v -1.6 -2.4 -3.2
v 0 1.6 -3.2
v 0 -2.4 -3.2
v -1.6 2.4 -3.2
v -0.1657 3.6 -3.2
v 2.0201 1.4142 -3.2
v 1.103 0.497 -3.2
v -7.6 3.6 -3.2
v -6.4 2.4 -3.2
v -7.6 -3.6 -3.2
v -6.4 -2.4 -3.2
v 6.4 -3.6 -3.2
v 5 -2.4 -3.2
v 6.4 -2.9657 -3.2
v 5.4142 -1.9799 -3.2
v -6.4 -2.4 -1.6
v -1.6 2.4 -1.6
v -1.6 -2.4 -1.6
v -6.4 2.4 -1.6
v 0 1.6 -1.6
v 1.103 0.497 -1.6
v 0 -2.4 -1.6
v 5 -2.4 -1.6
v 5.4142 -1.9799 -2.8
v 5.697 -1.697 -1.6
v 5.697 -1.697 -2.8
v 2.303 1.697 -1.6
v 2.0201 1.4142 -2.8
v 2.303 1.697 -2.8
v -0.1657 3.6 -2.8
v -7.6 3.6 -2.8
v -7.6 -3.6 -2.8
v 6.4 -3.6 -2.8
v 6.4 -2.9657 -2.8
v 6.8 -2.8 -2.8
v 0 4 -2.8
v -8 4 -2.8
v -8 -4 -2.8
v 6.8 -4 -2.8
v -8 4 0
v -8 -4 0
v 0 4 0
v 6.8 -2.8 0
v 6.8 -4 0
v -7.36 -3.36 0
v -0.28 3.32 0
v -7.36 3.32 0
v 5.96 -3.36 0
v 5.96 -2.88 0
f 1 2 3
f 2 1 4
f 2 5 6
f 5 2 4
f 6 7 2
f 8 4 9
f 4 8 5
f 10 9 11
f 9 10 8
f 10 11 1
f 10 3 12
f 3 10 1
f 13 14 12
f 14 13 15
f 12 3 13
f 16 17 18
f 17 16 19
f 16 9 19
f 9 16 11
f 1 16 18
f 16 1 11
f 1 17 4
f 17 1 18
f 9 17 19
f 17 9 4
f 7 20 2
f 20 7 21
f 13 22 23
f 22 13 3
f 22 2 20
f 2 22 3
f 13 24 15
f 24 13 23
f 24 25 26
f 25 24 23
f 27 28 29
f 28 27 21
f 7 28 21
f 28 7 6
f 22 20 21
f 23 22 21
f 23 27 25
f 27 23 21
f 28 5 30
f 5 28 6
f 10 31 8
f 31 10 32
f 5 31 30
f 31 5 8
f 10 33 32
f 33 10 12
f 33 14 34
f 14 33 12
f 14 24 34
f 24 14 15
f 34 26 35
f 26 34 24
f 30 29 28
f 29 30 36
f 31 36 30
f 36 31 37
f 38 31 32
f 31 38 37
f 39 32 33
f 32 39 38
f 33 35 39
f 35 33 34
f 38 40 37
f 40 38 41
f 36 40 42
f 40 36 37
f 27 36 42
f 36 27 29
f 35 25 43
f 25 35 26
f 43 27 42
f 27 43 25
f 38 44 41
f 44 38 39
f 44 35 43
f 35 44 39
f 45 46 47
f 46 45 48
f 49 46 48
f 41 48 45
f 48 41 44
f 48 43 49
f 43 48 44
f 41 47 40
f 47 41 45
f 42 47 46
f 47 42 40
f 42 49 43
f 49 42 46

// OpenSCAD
// file: ../p/rect3.scad
use <../lib.scad>
function ldraw_lib__rect3() = [
// 0 Rectangle with 3 Edges
// 0 Name: rect3.dat
// 0 Author: Mark Kennedy [mkennedy]
// 0 !LDRAW_ORG Primitive UPDATE 2010-01
// 0 !LICENSE Licensed under CC BY 4.0 : see CAreadme.txt
// 
// 0 BFC CERTIFY CCW
  [0,"BFC","CERTIFY"],
  [0,"BFC","CCW"],
// 
// 0 !HISTORY 2003-08-01 [PTadmin] Official Update 2003-02
// 0 !HISTORY 2007-06-24 [PTadmin] Header formatted for Contributor Agreement
// 0 !HISTORY 2008-07-01 [PTadmin] Official Update 2008-01
// 0 !HISTORY 2010-01-17 [mikeheide] Change winding to CCW
// 0 !HISTORY 2010-04-05 [PTadmin] Official Update 2010-01
// 
// 
// 2 24 1 0 1 -1 0 1
  [2,24,1,0,1,-1,0,1],
// 2 24 1 0 1 1 0 -1
  [2,24,1,0,1,1,0,-1],
// 2 24 -1 0 1 -1 0 -1
  [2,24,-1,0,1,-1,0,-1],
// 4 16 -1 0 1 -1 0 -1 1 0 -1 1 0 1
  [4,16,-1,0,1,-1,0,-1,1,0,-1,1,0,1],
// 0 //
];
module ldraw_lib__rect3(step=0, col=false, unit=2/5, alt=false, line=0.2, solid=!$preview)
    makepoly(ldraw_lib__rect3(), step=step, col=col, unit=unit, alt=alt, line=line, solid=solid);
ldraw_lib__rect3(line=0.2);
// file: ../p/rect.scad
use <../lib.scad>
function ldraw_lib__rect() = [
// 0 Rectangle
// 0 Name: rect.dat
// 0 Author: James Jessiman
// 0 !LDRAW_ORG Primitive UPDATE 2010-01
// 0 !LICENSE Licensed under CC BY 4.0 : see CAreadme.txt
// 
// 0 BFC CERTIFY CCW
  [0,"BFC","CERTIFY"],
  [0,"BFC","CCW"],
// 
// 0 !HISTORY 2002-04-05 [hafhead] Added BFC statement
// 0 !HISTORY 2002-04-25 [PTadmin] Official Update 2002-02
// 0 !HISTORY 2007-06-24 [PTadmin] Header formatted for Contributor Agreement
// 0 !HISTORY 2008-07-01 [PTadmin] Official Update 2008-01
// 0 !HISTORY 2010-01-17 [mikeheide] changed winding to CCW
// 0 !HISTORY 2010-04-05 [PTadmin] Official Update 2010-01
// 
// 
// 2 24 1 0 1 -1 0 1
  [2,24,1,0,1,-1,0,1],
// 2 24 -1 0 1 -1 0 -1
  [2,24,-1,0,1,-1,0,-1],
// 2 24 -1 0 -1 1 0 -1
  [2,24,-1,0,-1,1,0,-1],
// 2 24 1 0 -1 1 0 1
  [2,24,1,0,-1,1,0,1],
// 4 16 -1 0 1 -1 0 -1 1 0 -1 1 0 1
  [4,16,-1,0,1,-1,0,-1,1,0,-1,1,0,1],
// 0
];
module ldraw_lib__rect(step=0, col=false, unit=2/5, alt=false, line=0.2, solid=!$preview)
    makepoly(ldraw_lib__rect(), step=step, col=col, unit=unit, alt=alt, line=line, solid=solid);
ldraw_lib__rect(line=0.2);
// file: ../p/box5.scad
use <../lib.scad>
function ldraw_lib__box5() = [
// 0 Box with 5 Faces and All Edges
// 0 Name: box5.dat
// 0 Author: James Jessiman
// 0 !LDRAW_ORG Primitive UPDATE 2012-01
// 0 !LICENSE Licensed under CC BY 4.0 : see CAreadme.txt
// 
// 0 BFC CERTIFY CCW
  [0,"BFC","CERTIFY"],
  [0,"BFC","CCW"],
// 
// 0 !HISTORY 2002-04-03 [sbliss] Modified for BFC compliance
// 0 !HISTORY 2002-04-25 [PTadmin] Official Update 2002-02
// 0 !HISTORY 2007-06-24 [PTadmin] Header formatted for Contributor Agreement
// 0 !HISTORY 2008-07-01 [PTadmin] Official Update 2008-01
// 0 !HISTORY 2012-02-16 [Philo] Changed to CCW
// 0 !HISTORY 2012-03-30 [PTadmin] Official Update 2012-01
// 
// 
// 2 24 1 1 1 -1 1 1
  [2,24,1,1,1,-1,1,1],
// 2 24 -1 1 1 -1 1 -1
  [2,24,-1,1,1,-1,1,-1],
// 2 24 -1 1 -1 1 1 -1
  [2,24,-1,1,-1,1,1,-1],
// 2 24 1 1 -1 1 1 1
  [2,24,1,1,-1,1,1,1],
// 2 24 1 0 1 -1 0 1
  [2,24,1,0,1,-1,0,1],
// 2 24 -1 0 1 -1 0 -1
  [2,24,-1,0,1,-1,0,-1],
// 2 24 -1 0 -1 1 0 -1
  [2,24,-1,0,-1,1,0,-1],
// 2 24 1 0 -1 1 0 1
  [2,24,1,0,-1,1,0,1],
// 2 24 1 0 1 1 1 1
  [2,24,1,0,1,1,1,1],
// 2 24 -1 0 1 -1 1 1
  [2,24,-1,0,1,-1,1,1],
// 2 24 1 0 -1 1 1 -1
  [2,24,1,0,-1,1,1,-1],
// 2 24 -1 0 -1 -1 1 -1
  [2,24,-1,0,-1,-1,1,-1],
// 4 16 -1 1 1 1 1 1 1 1 -1 -1 1 -1
  [4,16,-1,1,1,1,1,1,1,1,-1,-1,1,-1],
// 4 16 -1 1 1 -1 0 1 1 0 1 1 1 1
  [4,16,-1,1,1,-1,0,1,1,0,1,1,1,1],
// 4 16 -1 1 -1 -1 0 -1 -1 0 1 -1 1 1
  [4,16,-1,1,-1,-1,0,-1,-1,0,1,-1,1,1],
// 4 16 1 1 -1 1 0 -1 -1 0 -1 -1 1 -1
  [4,16,1,1,-1,1,0,-1,-1,0,-1,-1,1,-1],
// 4 16 1 1 1 1 0 1 1 0 -1 1 1 -1
  [4,16,1,1,1,1,0,1,1,0,-1,1,1,-1],
];
module ldraw_lib__box5(step=0, col=false, unit=2/5, alt=false, line=0.2, solid=!$preview)
    makepoly(ldraw_lib__box5(), step=step, col=col, unit=unit, alt=alt, line=line, solid=solid);
ldraw_lib__box5(line=0.2);
// file: ../p/box2-7.scad
use <../lib.scad>
function ldraw_lib__box2_7() = [
// 0 Box with  2 Faces without  7 Edges
// 0 Name: box2-7.dat
// 0 Author: Willy Tschager [Holly-Wood]
// 0 !LDRAW_ORG Primitive UPDATE 2024-01
// 0 !LICENSE Licensed under CC BY 4.0 : see CAreadme.txt
// 
// 0 BFC CERTIFY CCW
  [0,"BFC","CERTIFY"],
  [0,"BFC","CCW"],
// 
// 0 !HISTORY 2009-05-02 [PTadmin] Official Update 2009-01
// 0 !HISTORY 2024-01-02 [Holly-Wood] Complete re-write, original by guyvivan
// 0 !HISTORY 2024-01-29 [OrionP] Official Update 2024-01
// 
// 2 24 -1 1 -1 -1 1 1
  [2,24,-1,1,-1,-1,1,1],
// 2 24 1 1 1 1 1 -1
  [2,24,1,1,1,1,1,-1],
// 4 16 -1 1 1 1 1 1 1 1 -1 -1 1 -1
  [4,16,-1,1,1,1,1,1,1,1,-1,-1,1,-1],
// 
// 2 24 -1 1 1 -1 -1 1
  [2,24,-1,1,1,-1,-1,1],
// 2 24 1 1 1 1 -1 1
  [2,24,1,1,1,1,-1,1],
// 4 16 1 -1 1 1 1 1 -1 1 1 -1 -1 1
  [4,16,1,-1,1,1,1,1,-1,1,1,-1,-1,1],
// 
// 2 24 -1 1 1 1 1 1
  [2,24,-1,1,1,1,1,1],
];
module ldraw_lib__box2_7(step=0, col=false, unit=2/5, alt=false, line=0.2, solid=!$preview)
    makepoly(ldraw_lib__box2_7(), step=step, col=col, unit=unit, alt=alt, line=line, solid=solid);
ldraw_lib__box2_7(line=0.2);
// file: ../p/box2-5.scad
use <../lib.scad>
function ldraw_lib__box2_5() = [
// 0 Box with 2 Faces without 5 Edges
// 0 Name: box2-5.dat
// 0 Author: Steffen [Steffen]
// 0 !LDRAW_ORG Primitive UPDATE 2003-03
// 0 !LICENSE Licensed under CC BY 4.0 : see CAreadme.txt
// 
// 0 BFC CERTIFY CCW
  [0,"BFC","CERTIFY"],
  [0,"BFC","CCW"],
// 
// 0 !HISTORY 2003-12-19 [PTadmin] Official Update 2003-03
// 0 !HISTORY 2007-06-24 [PTadmin] Header formatted for Contributor Agreement
// 0 !HISTORY 2008-07-01 [PTadmin] Official Update 2008-01
// 
// 
// 2 24 1 1 1 -1 1 1
  [2,24,1,1,1,-1,1,1],
// 2 24 1 1 -1 -1 1 -1
  [2,24,1,1,-1,-1,1,-1],
// 2 24 1 -1 1 -1 -1 1
  [2,24,1,-1,1,-1,-1,1],
// 2 24 -1 -1 1 -1 1 1
  [2,24,-1,-1,1,-1,1,1],
// 2 24 1 -1 1 1 1 1
  [2,24,1,-1,1,1,1,1],
// 2 24 -1 1 -1 -1 1 1
  [2,24,-1,1,-1,-1,1,1],
// 2 24 1 1 -1 1 1 1
  [2,24,1,1,-1,1,1,1],
// 4 16 1 1 1 1 1 -1 -1 1 -1 -1 1 1
  [4,16,1,1,1,1,1,-1,-1,1,-1,-1,1,1],
// 4 16 1 1 1 -1 1 1 -1 -1 1 1 -1 1
  [4,16,1,1,1,-1,1,1,-1,-1,1,1,-1,1],
// 0
];
module ldraw_lib__box2_5(step=0, col=false, unit=2/5, alt=false, line=0.2, solid=!$preview)
    makepoly(ldraw_lib__box2_5(), step=step, col=col, unit=unit, alt=alt, line=line, solid=solid);
ldraw_lib__box2_5(line=0.2);
// file: s/5092s01.scad
use <../../lib.scad>
use <../../p/box2-5.scad>
use <../../p/box2-7.scad>
use <../../p/box5.scad>
use <../../p/rect.scad>
use <../../p/rect3.scad>
function ldraw_lib__s__5092s01() = [
// 0 ~Tile  1 x  2 Cut Right 45 Degree without Patternable Surfaces
// 0 Name: s\5092s01.dat
// 0 Author: Gerald Lasser [GeraldLasser]
// 0 !LDRAW_ORG Subpart UPDATE 2025-03
// 0 !LICENSE Licensed under CC BY 4.0 : see CAreadme.txt
// 
// 0 BFC CERTIFY CCW
  [0,"BFC","CERTIFY"],
  [0,"BFC","CCW"],
// 
// 0 !HISTORY 2025-03-30 [OrionP] Official Update 2025-03
// 
// 0 // Bottom
// 4 16 -4 8 6 0 8 6 0 8 -4 -4 8 -6
  [4,16,-4,8,6,0,8,6,0,8,-4,-4,8,-6],
// 4 16 5.0503 8 -3.5355 -.4142 8 -9 -4 8 -6 0 8 -4
  [4,16,5.0503,8,-3.5355,-.4142,8,-9,-4,8,-6,0,8,-4],
// 3 16 0 8 -4 2.7574 8 -1.2426 5.0503 8 -3.5355
  [3,16,0,8,-4,2.7574,8,-1.2426,5.0503,8,-3.5355],
// 4 16 -19 8 -9 -16 8 -6 -4 8 -6 -.4142 8 -9
  [4,16,-19,8,-9,-16,8,-6,-4,8,-6,-.4142,8,-9],
// 4 16 -19 8 9 -16 8 6 -16 8 -6 -19 8 -9
  [4,16,-19,8,9,-16,8,6,-16,8,-6,-19,8,-9],
// 3 16 -4 8 6 -16 8 6 -19 8 9
  [3,16,-4,8,6,-16,8,6,-19,8,9],
// 4 16 -19 8 9 16 8 9 0 8 6 -4 8 6
  [4,16,-19,8,9,16,8,9,0,8,6,-4,8,6],
// 4 16 16 8 7.4142 13.5355 8 4.9497 12.5 8 6 16 8 9
  [4,16,16,8,7.4142,13.5355,8,4.9497,12.5,8,6,16,8,9],
// 3 16 12.5 8 6 0 8 6 16 8 9
  [3,16,12.5,8,6,0,8,6,16,8,9],
// 0 BFC INVERTNEXT
  [0,"BFC","INVERTNEXT"],
// 1 16 -10 8 0 0 0 -6 0 -4 0 -6 0 0 box5.dat
  [1,16,-10,8,0,0,0,-6,0,-4,0,-6,0,0, ldraw_lib__box5()],
// 1 16 1.3787 6 -2.6213 0 0 1.3787 -2 0 0 0 -1 1.3787 rect3.dat
  [1,16,1.3787,6,-2.6213,0,0,1.3787,-2,0,0,0,-1,1.3787, ldraw_lib__rect3()],
// 0 BFC INVERTNEXT
  [0,"BFC","INVERTNEXT"],
// 1 16 6.25 6 1 0 0 -6.25 -2 0 0 0 5 0 box2-5.dat
  [1,16,6.25,6,1,0,0,-6.25,-2,0,0,0,5,0, ldraw_lib__box2_5()],
// 4 16 13.5355 8 4.9497 13.5355 7 4.9497 12.5 4 6 12.5 8 6
  [4,16,13.5355,8,4.9497,13.5355,7,4.9497,12.5,4,6,12.5,8,6],
// 4 16 12.5 4 6 13.5355 7 4.9497 14.2426 7 4.2426 14.2426 4 4.2426
  [4,16,12.5,4,6,13.5355,7,4.9497,14.2426,7,4.2426,14.2426,4,4.2426],
// 4 16 5.7574 7 -4.2426 5.0503 7 -3.5355 2.7574 4 -1.2426 5.7574 4 -4.2426
  [4,16,5.7574,7,-4.2426,5.0503,7,-3.5355,2.7574,4,-1.2426,5.7574,4,-4.2426],
// 4 16 2.7574 4 -1.2426 5.0503 7 -3.5355 5.0503 8 -3.5355 2.7574 8 -1.2426
  [4,16,2.7574,4,-1.2426,5.0503,7,-3.5355,5.0503,8,-3.5355,2.7574,8,-1.2426],
// 2 24 13.5355 7 4.9497 14.2426 7 4.2426
  [2,24,13.5355,7,4.9497,14.2426,7,4.2426],
// 2 24 5.0503 7 -3.5355 5.7574 7 -4.2426
  [2,24,5.0503,7,-3.5355,5.7574,7,-4.2426],
// 2 24 13.5355 8 4.9497 12.5 8 6
  [2,24,13.5355,8,4.9497,12.5,8,6],
// 2 24 2.7574 8 -1.2426 5.0503 8 -3.5355
  [2,24,2.7574,8,-1.2426,5.0503,8,-3.5355],
// 3 16 2.7574 4 -1.2426 0 4 -4 0 4 6
  [3,16,2.7574,4,-1.2426,0,4,-4,0,4,6],
// 3 16 2.7574 4 -1.2426 0 4 6 12.5 4 6
  [3,16,2.7574,4,-1.2426,0,4,6,12.5,4,6],
// 4 16 2.7574 4 -1.2426 12.5 4 6 14.2426 4 4.2426 5.7574 4 -4.2426
  [4,16,2.7574,4,-1.2426,12.5,4,6,14.2426,4,4.2426,5.7574,4,-4.2426],
// 2 24 12.5 4 6 14.2426 4 4.2426
  [2,24,12.5,4,6,14.2426,4,4.2426],
// 2 24 14.2426 4 4.2426 5.7574 4 -4.2426
  [2,24,14.2426,4,4.2426,5.7574,4,-4.2426],
// 2 24 5.7574 4 -4.2426 2.7574 4 -1.2426
  [2,24,5.7574,4,-4.2426,2.7574,4,-1.2426],
// 
// 0 // Lip
// 1 16 2.318 7.5 -6.2678 2.73225 -1 0 0 0 .5 2.73225 0 0 rect.dat
  [1,16,2.318,7.5,-6.2678,2.73225,-1,0,0,0,.5,2.73225,0,0, ldraw_lib__rect()],
// 1 16 -9.7071 7.5 0 0 -9.2929 0 .5 0 0 0 0 -9 box2-7.dat
  [1,16,-9.7071,7.5,0,0,-9.2929,0,.5,0,0,0,0,-9, ldraw_lib__box2_7()],
// 1 16 -1.5 7.5 8.2071 0 0 17.5 -.5 0 0 0 .7929 0 box2-5.dat
  [1,16,-1.5,7.5,8.2071,0,0,17.5,-.5,0,0,0,.7929,0, ldraw_lib__box2_5()],
// 1 16 14.76775 7.5 6.18195 0 0 -1.23225 -.5 0 0 0 1 -1.23225 rect3.dat
  [1,16,14.76775,7.5,6.18195,0,0,-1.23225,-.5,0,0,0,1,-1.23225, ldraw_lib__rect3()],
// 4 16 13.5355 7 4.9497 16 7 7.4142 17 7 7 14.2426 7 4.2426
  [4,16,13.5355,7,4.9497,16,7,7.4142,17,7,7,14.2426,7,4.2426],
// 4 16 -.4142 7 -9 5.0503 7 -3.5355 5.7574 7 -4.2426 0 7 -10
  [4,16,-.4142,7,-9,5.0503,7,-3.5355,5.7574,7,-4.2426,0,7,-10],
// 4 16 -.4142 7 -9 0 7 -10 -20 7 -10 -19 7 -9
  [4,16,-.4142,7,-9,0,7,-10,-20,7,-10,-19,7,-9],
// 4 16 -19 7 -9 -20 7 -10 -20 7 10 -19 7 9
  [4,16,-19,7,-9,-20,7,-10,-20,7,10,-19,7,9],
// 4 16 -19 7 9 -20 7 10 17 7 10 16 7 9
  [4,16,-19,7,9,-20,7,10,17,7,10,16,7,9],
// 4 16 16 7 9 17 7 10 17 7 7 16 7 7.4142
  [4,16,16,7,9,17,7,10,17,7,7,16,7,7.4142],
// 
// 0 // Outside
// 1 16 -10 3.5 0 0 -10 0 3.5 0 0 0 0 -10 box2-5.dat
  [1,16,-10,3.5,0,0,-10,0,3.5,0,0,0,0,-10, ldraw_lib__box2_5()],
// 4 16 0 0 -10 0 7 -10 5.7574 7 -4.2426 5.7574 4 -4.2426
  [4,16,0,0,-10,0,7,-10,5.7574,7,-4.2426,5.7574,4,-4.2426],
// 4 16 14.2426 4 4.2426 14.2426 7 4.2426 17 7 7 17 0 7
  [4,16,14.2426,4,4.2426,14.2426,7,4.2426,17,7,7,17,0,7],
// 4 16 5.7574 4 -4.2426 14.2426 4 4.2426 17 0 7 0 0 -10
  [4,16,5.7574,4,-4.2426,14.2426,4,4.2426,17,0,7,0,0,-10],
// 2 24 14.2426 7 4.2426 14.2426 4 4.2426
  [2,24,14.2426,7,4.2426,14.2426,4,4.2426],
// 2 24 5.7574 4 -4.2426 5.7574 7 -4.2426
  [2,24,5.7574,4,-4.2426,5.7574,7,-4.2426],
// 2 24 17 7 7 14.2426 7 4.2426
  [2,24,17,7,7,14.2426,7,4.2426],
// 2 24 5.7574 7 -4.2426 0 7 -10
  [2,24,5.7574,7,-4.2426,0,7,-10],
// 2 24 0 0 -10 17 0 7
  [2,24,0,0,-10,17,0,7],
// 2 24 17 0 7 17 7 7
  [2,24,17,0,7,17,7,7],
// 1 16 -1.5 3.5 8.5 0 0 18.5 -3.5 0 0 0 1.5 0 box2-7.dat
  [1,16,-1.5,3.5,8.5,0,0,18.5,-3.5,0,0,0,1.5,0, ldraw_lib__box2_7()],
];
module ldraw_lib__s__5092s01(step=0, col=false, unit=2/5, alt=false, line=0.2, solid=!$preview)
    makepoly(ldraw_lib__s__5092s01(), step=step, col=col, unit=unit, alt=alt, line=line, solid=solid);
ldraw_lib__s__5092s01(line=0.2);
// file: 5092p01.scad
use <../lib.scad>
use <s/5092s01.scad>
function ldraw_lib__5092p01() = [
// 0 Tile 1 x 2 Cut Right 45 Degree with Olive Green Pattern
// 0 Name: 5092p01.dat
// 0 Author: Jeff Jones [notmaster]
// 0 !LDRAW_ORG Part UPDATE 2025-08
// 0 !LICENSE Licensed under CC BY 4.0 : see CAreadme.txt
// 
// 0 BFC CERTIFY CCW
  [0,"BFC","CERTIFY"],
  [0,"BFC","CCW"],
// 
// 0 !KEYWORDS Bricklink 5092pb001, Rebrickable 5092pr0001, Set 76923
// 
// 0 !HISTORY 2025-08-31 [OrionP] Official Update 2025-08
// 
// 1 16 0 0 0 1 0 0 0 1 0 0 0 1 s\5092s01.dat
  [1,16,0,0,0,1,0,0,0,1,0,0,0,1, ldraw_lib__s__5092s01()],
// 4 330 -18.4 0 -8.3 -.7 0 -8.3 14.9 0 8.4 -18.4 0 8.4
  [4,330,-18.4,0,-8.3,-.7,0,-8.3,14.9,0,8.4,-18.4,0,8.4],
// 3 330 14.9 0 8.4 -.7 0 -8.3 14.9 0 7.2
  [3,330,14.9,0,8.4,-.7,0,-8.3,14.9,0,7.2],
// 4 16 17 0 10 -20 0 10 -18.4 0 8.4 14.9 0 8.4
  [4,16,17,0,10,-20,0,10,-18.4,0,8.4,14.9,0,8.4],
// 4 16 17 0 7 17 0 10 14.9 0 8.4 14.9 0 7.2
  [4,16,17,0,7,17,0,10,14.9,0,8.4,14.9,0,7.2],
// 4 16 -18.4 0 8.4 -20 0 10 -20 0 -10 -18.4 0 -8.3
  [4,16,-18.4,0,8.4,-20,0,10,-20,0,-10,-18.4,0,-8.3],
// 4 16 -18.4 0 -8.3 -20 0 -10 0 0 -10 -.7 0 -8.3
  [4,16,-18.4,0,-8.3,-20,0,-10,0,0,-10,-.7,0,-8.3],
// 4 16 -.7 0 -8.3 0 0 -10 17 0 7 14.9 0 7.2
  [4,16,-.7,0,-8.3,0,0,-10,17,0,7,14.9,0,7.2],
];
module ldraw_lib__5092p01(step=0, col=false, unit=2/5, alt=false, line=0.2, solid=!$preview)
    makepoly(ldraw_lib__5092p01(), step=step, col=col, unit=unit, alt=alt, line=line, solid=solid);
ldraw_lib__5092p01(line=0.2);
// main file
use <../lib.scad>
use <5092p01.scad>
function ldraw_lib__5091p01() = [
// 0 Tile 1 x 2 Cut Left 45 Degree with Olive Green Pattern
// 0 Name: 5091p01.dat
// 0 Author: Jeff Jones [notmaster]
// 0 !LDRAW_ORG Part UPDATE 2025-08
// 0 !LICENSE Licensed under CC BY 4.0 : see CAreadme.txt
// 
// 0 BFC CERTIFY CCW
  [0,"BFC","CERTIFY"],
  [0,"BFC","CCW"],
// 
// 0 !KEYWORDS Bricklink 5091pb001, Rebrickable 5091pr0001, Set 76923
// 
// 0 !HISTORY 2025-08-31 [OrionP] Official Update 2025-08
// 
// 1 16 0 0 0 1 0 0 0 1 0 0 0 -1 5092p01.dat
  [1,16,0,0,0,1,0,0,0,1,0,0,0,-1, ldraw_lib__5092p01()],
];
module ldraw_lib__5091p01(step=0, col=false, unit=2/5, alt=false, line=0.2, solid=!$preview)
    makepoly(ldraw_lib__5091p01(), step=step, col=col, unit=unit, alt=alt, line=line, solid=solid);
ldraw_lib__5091p01(line=0.2);
